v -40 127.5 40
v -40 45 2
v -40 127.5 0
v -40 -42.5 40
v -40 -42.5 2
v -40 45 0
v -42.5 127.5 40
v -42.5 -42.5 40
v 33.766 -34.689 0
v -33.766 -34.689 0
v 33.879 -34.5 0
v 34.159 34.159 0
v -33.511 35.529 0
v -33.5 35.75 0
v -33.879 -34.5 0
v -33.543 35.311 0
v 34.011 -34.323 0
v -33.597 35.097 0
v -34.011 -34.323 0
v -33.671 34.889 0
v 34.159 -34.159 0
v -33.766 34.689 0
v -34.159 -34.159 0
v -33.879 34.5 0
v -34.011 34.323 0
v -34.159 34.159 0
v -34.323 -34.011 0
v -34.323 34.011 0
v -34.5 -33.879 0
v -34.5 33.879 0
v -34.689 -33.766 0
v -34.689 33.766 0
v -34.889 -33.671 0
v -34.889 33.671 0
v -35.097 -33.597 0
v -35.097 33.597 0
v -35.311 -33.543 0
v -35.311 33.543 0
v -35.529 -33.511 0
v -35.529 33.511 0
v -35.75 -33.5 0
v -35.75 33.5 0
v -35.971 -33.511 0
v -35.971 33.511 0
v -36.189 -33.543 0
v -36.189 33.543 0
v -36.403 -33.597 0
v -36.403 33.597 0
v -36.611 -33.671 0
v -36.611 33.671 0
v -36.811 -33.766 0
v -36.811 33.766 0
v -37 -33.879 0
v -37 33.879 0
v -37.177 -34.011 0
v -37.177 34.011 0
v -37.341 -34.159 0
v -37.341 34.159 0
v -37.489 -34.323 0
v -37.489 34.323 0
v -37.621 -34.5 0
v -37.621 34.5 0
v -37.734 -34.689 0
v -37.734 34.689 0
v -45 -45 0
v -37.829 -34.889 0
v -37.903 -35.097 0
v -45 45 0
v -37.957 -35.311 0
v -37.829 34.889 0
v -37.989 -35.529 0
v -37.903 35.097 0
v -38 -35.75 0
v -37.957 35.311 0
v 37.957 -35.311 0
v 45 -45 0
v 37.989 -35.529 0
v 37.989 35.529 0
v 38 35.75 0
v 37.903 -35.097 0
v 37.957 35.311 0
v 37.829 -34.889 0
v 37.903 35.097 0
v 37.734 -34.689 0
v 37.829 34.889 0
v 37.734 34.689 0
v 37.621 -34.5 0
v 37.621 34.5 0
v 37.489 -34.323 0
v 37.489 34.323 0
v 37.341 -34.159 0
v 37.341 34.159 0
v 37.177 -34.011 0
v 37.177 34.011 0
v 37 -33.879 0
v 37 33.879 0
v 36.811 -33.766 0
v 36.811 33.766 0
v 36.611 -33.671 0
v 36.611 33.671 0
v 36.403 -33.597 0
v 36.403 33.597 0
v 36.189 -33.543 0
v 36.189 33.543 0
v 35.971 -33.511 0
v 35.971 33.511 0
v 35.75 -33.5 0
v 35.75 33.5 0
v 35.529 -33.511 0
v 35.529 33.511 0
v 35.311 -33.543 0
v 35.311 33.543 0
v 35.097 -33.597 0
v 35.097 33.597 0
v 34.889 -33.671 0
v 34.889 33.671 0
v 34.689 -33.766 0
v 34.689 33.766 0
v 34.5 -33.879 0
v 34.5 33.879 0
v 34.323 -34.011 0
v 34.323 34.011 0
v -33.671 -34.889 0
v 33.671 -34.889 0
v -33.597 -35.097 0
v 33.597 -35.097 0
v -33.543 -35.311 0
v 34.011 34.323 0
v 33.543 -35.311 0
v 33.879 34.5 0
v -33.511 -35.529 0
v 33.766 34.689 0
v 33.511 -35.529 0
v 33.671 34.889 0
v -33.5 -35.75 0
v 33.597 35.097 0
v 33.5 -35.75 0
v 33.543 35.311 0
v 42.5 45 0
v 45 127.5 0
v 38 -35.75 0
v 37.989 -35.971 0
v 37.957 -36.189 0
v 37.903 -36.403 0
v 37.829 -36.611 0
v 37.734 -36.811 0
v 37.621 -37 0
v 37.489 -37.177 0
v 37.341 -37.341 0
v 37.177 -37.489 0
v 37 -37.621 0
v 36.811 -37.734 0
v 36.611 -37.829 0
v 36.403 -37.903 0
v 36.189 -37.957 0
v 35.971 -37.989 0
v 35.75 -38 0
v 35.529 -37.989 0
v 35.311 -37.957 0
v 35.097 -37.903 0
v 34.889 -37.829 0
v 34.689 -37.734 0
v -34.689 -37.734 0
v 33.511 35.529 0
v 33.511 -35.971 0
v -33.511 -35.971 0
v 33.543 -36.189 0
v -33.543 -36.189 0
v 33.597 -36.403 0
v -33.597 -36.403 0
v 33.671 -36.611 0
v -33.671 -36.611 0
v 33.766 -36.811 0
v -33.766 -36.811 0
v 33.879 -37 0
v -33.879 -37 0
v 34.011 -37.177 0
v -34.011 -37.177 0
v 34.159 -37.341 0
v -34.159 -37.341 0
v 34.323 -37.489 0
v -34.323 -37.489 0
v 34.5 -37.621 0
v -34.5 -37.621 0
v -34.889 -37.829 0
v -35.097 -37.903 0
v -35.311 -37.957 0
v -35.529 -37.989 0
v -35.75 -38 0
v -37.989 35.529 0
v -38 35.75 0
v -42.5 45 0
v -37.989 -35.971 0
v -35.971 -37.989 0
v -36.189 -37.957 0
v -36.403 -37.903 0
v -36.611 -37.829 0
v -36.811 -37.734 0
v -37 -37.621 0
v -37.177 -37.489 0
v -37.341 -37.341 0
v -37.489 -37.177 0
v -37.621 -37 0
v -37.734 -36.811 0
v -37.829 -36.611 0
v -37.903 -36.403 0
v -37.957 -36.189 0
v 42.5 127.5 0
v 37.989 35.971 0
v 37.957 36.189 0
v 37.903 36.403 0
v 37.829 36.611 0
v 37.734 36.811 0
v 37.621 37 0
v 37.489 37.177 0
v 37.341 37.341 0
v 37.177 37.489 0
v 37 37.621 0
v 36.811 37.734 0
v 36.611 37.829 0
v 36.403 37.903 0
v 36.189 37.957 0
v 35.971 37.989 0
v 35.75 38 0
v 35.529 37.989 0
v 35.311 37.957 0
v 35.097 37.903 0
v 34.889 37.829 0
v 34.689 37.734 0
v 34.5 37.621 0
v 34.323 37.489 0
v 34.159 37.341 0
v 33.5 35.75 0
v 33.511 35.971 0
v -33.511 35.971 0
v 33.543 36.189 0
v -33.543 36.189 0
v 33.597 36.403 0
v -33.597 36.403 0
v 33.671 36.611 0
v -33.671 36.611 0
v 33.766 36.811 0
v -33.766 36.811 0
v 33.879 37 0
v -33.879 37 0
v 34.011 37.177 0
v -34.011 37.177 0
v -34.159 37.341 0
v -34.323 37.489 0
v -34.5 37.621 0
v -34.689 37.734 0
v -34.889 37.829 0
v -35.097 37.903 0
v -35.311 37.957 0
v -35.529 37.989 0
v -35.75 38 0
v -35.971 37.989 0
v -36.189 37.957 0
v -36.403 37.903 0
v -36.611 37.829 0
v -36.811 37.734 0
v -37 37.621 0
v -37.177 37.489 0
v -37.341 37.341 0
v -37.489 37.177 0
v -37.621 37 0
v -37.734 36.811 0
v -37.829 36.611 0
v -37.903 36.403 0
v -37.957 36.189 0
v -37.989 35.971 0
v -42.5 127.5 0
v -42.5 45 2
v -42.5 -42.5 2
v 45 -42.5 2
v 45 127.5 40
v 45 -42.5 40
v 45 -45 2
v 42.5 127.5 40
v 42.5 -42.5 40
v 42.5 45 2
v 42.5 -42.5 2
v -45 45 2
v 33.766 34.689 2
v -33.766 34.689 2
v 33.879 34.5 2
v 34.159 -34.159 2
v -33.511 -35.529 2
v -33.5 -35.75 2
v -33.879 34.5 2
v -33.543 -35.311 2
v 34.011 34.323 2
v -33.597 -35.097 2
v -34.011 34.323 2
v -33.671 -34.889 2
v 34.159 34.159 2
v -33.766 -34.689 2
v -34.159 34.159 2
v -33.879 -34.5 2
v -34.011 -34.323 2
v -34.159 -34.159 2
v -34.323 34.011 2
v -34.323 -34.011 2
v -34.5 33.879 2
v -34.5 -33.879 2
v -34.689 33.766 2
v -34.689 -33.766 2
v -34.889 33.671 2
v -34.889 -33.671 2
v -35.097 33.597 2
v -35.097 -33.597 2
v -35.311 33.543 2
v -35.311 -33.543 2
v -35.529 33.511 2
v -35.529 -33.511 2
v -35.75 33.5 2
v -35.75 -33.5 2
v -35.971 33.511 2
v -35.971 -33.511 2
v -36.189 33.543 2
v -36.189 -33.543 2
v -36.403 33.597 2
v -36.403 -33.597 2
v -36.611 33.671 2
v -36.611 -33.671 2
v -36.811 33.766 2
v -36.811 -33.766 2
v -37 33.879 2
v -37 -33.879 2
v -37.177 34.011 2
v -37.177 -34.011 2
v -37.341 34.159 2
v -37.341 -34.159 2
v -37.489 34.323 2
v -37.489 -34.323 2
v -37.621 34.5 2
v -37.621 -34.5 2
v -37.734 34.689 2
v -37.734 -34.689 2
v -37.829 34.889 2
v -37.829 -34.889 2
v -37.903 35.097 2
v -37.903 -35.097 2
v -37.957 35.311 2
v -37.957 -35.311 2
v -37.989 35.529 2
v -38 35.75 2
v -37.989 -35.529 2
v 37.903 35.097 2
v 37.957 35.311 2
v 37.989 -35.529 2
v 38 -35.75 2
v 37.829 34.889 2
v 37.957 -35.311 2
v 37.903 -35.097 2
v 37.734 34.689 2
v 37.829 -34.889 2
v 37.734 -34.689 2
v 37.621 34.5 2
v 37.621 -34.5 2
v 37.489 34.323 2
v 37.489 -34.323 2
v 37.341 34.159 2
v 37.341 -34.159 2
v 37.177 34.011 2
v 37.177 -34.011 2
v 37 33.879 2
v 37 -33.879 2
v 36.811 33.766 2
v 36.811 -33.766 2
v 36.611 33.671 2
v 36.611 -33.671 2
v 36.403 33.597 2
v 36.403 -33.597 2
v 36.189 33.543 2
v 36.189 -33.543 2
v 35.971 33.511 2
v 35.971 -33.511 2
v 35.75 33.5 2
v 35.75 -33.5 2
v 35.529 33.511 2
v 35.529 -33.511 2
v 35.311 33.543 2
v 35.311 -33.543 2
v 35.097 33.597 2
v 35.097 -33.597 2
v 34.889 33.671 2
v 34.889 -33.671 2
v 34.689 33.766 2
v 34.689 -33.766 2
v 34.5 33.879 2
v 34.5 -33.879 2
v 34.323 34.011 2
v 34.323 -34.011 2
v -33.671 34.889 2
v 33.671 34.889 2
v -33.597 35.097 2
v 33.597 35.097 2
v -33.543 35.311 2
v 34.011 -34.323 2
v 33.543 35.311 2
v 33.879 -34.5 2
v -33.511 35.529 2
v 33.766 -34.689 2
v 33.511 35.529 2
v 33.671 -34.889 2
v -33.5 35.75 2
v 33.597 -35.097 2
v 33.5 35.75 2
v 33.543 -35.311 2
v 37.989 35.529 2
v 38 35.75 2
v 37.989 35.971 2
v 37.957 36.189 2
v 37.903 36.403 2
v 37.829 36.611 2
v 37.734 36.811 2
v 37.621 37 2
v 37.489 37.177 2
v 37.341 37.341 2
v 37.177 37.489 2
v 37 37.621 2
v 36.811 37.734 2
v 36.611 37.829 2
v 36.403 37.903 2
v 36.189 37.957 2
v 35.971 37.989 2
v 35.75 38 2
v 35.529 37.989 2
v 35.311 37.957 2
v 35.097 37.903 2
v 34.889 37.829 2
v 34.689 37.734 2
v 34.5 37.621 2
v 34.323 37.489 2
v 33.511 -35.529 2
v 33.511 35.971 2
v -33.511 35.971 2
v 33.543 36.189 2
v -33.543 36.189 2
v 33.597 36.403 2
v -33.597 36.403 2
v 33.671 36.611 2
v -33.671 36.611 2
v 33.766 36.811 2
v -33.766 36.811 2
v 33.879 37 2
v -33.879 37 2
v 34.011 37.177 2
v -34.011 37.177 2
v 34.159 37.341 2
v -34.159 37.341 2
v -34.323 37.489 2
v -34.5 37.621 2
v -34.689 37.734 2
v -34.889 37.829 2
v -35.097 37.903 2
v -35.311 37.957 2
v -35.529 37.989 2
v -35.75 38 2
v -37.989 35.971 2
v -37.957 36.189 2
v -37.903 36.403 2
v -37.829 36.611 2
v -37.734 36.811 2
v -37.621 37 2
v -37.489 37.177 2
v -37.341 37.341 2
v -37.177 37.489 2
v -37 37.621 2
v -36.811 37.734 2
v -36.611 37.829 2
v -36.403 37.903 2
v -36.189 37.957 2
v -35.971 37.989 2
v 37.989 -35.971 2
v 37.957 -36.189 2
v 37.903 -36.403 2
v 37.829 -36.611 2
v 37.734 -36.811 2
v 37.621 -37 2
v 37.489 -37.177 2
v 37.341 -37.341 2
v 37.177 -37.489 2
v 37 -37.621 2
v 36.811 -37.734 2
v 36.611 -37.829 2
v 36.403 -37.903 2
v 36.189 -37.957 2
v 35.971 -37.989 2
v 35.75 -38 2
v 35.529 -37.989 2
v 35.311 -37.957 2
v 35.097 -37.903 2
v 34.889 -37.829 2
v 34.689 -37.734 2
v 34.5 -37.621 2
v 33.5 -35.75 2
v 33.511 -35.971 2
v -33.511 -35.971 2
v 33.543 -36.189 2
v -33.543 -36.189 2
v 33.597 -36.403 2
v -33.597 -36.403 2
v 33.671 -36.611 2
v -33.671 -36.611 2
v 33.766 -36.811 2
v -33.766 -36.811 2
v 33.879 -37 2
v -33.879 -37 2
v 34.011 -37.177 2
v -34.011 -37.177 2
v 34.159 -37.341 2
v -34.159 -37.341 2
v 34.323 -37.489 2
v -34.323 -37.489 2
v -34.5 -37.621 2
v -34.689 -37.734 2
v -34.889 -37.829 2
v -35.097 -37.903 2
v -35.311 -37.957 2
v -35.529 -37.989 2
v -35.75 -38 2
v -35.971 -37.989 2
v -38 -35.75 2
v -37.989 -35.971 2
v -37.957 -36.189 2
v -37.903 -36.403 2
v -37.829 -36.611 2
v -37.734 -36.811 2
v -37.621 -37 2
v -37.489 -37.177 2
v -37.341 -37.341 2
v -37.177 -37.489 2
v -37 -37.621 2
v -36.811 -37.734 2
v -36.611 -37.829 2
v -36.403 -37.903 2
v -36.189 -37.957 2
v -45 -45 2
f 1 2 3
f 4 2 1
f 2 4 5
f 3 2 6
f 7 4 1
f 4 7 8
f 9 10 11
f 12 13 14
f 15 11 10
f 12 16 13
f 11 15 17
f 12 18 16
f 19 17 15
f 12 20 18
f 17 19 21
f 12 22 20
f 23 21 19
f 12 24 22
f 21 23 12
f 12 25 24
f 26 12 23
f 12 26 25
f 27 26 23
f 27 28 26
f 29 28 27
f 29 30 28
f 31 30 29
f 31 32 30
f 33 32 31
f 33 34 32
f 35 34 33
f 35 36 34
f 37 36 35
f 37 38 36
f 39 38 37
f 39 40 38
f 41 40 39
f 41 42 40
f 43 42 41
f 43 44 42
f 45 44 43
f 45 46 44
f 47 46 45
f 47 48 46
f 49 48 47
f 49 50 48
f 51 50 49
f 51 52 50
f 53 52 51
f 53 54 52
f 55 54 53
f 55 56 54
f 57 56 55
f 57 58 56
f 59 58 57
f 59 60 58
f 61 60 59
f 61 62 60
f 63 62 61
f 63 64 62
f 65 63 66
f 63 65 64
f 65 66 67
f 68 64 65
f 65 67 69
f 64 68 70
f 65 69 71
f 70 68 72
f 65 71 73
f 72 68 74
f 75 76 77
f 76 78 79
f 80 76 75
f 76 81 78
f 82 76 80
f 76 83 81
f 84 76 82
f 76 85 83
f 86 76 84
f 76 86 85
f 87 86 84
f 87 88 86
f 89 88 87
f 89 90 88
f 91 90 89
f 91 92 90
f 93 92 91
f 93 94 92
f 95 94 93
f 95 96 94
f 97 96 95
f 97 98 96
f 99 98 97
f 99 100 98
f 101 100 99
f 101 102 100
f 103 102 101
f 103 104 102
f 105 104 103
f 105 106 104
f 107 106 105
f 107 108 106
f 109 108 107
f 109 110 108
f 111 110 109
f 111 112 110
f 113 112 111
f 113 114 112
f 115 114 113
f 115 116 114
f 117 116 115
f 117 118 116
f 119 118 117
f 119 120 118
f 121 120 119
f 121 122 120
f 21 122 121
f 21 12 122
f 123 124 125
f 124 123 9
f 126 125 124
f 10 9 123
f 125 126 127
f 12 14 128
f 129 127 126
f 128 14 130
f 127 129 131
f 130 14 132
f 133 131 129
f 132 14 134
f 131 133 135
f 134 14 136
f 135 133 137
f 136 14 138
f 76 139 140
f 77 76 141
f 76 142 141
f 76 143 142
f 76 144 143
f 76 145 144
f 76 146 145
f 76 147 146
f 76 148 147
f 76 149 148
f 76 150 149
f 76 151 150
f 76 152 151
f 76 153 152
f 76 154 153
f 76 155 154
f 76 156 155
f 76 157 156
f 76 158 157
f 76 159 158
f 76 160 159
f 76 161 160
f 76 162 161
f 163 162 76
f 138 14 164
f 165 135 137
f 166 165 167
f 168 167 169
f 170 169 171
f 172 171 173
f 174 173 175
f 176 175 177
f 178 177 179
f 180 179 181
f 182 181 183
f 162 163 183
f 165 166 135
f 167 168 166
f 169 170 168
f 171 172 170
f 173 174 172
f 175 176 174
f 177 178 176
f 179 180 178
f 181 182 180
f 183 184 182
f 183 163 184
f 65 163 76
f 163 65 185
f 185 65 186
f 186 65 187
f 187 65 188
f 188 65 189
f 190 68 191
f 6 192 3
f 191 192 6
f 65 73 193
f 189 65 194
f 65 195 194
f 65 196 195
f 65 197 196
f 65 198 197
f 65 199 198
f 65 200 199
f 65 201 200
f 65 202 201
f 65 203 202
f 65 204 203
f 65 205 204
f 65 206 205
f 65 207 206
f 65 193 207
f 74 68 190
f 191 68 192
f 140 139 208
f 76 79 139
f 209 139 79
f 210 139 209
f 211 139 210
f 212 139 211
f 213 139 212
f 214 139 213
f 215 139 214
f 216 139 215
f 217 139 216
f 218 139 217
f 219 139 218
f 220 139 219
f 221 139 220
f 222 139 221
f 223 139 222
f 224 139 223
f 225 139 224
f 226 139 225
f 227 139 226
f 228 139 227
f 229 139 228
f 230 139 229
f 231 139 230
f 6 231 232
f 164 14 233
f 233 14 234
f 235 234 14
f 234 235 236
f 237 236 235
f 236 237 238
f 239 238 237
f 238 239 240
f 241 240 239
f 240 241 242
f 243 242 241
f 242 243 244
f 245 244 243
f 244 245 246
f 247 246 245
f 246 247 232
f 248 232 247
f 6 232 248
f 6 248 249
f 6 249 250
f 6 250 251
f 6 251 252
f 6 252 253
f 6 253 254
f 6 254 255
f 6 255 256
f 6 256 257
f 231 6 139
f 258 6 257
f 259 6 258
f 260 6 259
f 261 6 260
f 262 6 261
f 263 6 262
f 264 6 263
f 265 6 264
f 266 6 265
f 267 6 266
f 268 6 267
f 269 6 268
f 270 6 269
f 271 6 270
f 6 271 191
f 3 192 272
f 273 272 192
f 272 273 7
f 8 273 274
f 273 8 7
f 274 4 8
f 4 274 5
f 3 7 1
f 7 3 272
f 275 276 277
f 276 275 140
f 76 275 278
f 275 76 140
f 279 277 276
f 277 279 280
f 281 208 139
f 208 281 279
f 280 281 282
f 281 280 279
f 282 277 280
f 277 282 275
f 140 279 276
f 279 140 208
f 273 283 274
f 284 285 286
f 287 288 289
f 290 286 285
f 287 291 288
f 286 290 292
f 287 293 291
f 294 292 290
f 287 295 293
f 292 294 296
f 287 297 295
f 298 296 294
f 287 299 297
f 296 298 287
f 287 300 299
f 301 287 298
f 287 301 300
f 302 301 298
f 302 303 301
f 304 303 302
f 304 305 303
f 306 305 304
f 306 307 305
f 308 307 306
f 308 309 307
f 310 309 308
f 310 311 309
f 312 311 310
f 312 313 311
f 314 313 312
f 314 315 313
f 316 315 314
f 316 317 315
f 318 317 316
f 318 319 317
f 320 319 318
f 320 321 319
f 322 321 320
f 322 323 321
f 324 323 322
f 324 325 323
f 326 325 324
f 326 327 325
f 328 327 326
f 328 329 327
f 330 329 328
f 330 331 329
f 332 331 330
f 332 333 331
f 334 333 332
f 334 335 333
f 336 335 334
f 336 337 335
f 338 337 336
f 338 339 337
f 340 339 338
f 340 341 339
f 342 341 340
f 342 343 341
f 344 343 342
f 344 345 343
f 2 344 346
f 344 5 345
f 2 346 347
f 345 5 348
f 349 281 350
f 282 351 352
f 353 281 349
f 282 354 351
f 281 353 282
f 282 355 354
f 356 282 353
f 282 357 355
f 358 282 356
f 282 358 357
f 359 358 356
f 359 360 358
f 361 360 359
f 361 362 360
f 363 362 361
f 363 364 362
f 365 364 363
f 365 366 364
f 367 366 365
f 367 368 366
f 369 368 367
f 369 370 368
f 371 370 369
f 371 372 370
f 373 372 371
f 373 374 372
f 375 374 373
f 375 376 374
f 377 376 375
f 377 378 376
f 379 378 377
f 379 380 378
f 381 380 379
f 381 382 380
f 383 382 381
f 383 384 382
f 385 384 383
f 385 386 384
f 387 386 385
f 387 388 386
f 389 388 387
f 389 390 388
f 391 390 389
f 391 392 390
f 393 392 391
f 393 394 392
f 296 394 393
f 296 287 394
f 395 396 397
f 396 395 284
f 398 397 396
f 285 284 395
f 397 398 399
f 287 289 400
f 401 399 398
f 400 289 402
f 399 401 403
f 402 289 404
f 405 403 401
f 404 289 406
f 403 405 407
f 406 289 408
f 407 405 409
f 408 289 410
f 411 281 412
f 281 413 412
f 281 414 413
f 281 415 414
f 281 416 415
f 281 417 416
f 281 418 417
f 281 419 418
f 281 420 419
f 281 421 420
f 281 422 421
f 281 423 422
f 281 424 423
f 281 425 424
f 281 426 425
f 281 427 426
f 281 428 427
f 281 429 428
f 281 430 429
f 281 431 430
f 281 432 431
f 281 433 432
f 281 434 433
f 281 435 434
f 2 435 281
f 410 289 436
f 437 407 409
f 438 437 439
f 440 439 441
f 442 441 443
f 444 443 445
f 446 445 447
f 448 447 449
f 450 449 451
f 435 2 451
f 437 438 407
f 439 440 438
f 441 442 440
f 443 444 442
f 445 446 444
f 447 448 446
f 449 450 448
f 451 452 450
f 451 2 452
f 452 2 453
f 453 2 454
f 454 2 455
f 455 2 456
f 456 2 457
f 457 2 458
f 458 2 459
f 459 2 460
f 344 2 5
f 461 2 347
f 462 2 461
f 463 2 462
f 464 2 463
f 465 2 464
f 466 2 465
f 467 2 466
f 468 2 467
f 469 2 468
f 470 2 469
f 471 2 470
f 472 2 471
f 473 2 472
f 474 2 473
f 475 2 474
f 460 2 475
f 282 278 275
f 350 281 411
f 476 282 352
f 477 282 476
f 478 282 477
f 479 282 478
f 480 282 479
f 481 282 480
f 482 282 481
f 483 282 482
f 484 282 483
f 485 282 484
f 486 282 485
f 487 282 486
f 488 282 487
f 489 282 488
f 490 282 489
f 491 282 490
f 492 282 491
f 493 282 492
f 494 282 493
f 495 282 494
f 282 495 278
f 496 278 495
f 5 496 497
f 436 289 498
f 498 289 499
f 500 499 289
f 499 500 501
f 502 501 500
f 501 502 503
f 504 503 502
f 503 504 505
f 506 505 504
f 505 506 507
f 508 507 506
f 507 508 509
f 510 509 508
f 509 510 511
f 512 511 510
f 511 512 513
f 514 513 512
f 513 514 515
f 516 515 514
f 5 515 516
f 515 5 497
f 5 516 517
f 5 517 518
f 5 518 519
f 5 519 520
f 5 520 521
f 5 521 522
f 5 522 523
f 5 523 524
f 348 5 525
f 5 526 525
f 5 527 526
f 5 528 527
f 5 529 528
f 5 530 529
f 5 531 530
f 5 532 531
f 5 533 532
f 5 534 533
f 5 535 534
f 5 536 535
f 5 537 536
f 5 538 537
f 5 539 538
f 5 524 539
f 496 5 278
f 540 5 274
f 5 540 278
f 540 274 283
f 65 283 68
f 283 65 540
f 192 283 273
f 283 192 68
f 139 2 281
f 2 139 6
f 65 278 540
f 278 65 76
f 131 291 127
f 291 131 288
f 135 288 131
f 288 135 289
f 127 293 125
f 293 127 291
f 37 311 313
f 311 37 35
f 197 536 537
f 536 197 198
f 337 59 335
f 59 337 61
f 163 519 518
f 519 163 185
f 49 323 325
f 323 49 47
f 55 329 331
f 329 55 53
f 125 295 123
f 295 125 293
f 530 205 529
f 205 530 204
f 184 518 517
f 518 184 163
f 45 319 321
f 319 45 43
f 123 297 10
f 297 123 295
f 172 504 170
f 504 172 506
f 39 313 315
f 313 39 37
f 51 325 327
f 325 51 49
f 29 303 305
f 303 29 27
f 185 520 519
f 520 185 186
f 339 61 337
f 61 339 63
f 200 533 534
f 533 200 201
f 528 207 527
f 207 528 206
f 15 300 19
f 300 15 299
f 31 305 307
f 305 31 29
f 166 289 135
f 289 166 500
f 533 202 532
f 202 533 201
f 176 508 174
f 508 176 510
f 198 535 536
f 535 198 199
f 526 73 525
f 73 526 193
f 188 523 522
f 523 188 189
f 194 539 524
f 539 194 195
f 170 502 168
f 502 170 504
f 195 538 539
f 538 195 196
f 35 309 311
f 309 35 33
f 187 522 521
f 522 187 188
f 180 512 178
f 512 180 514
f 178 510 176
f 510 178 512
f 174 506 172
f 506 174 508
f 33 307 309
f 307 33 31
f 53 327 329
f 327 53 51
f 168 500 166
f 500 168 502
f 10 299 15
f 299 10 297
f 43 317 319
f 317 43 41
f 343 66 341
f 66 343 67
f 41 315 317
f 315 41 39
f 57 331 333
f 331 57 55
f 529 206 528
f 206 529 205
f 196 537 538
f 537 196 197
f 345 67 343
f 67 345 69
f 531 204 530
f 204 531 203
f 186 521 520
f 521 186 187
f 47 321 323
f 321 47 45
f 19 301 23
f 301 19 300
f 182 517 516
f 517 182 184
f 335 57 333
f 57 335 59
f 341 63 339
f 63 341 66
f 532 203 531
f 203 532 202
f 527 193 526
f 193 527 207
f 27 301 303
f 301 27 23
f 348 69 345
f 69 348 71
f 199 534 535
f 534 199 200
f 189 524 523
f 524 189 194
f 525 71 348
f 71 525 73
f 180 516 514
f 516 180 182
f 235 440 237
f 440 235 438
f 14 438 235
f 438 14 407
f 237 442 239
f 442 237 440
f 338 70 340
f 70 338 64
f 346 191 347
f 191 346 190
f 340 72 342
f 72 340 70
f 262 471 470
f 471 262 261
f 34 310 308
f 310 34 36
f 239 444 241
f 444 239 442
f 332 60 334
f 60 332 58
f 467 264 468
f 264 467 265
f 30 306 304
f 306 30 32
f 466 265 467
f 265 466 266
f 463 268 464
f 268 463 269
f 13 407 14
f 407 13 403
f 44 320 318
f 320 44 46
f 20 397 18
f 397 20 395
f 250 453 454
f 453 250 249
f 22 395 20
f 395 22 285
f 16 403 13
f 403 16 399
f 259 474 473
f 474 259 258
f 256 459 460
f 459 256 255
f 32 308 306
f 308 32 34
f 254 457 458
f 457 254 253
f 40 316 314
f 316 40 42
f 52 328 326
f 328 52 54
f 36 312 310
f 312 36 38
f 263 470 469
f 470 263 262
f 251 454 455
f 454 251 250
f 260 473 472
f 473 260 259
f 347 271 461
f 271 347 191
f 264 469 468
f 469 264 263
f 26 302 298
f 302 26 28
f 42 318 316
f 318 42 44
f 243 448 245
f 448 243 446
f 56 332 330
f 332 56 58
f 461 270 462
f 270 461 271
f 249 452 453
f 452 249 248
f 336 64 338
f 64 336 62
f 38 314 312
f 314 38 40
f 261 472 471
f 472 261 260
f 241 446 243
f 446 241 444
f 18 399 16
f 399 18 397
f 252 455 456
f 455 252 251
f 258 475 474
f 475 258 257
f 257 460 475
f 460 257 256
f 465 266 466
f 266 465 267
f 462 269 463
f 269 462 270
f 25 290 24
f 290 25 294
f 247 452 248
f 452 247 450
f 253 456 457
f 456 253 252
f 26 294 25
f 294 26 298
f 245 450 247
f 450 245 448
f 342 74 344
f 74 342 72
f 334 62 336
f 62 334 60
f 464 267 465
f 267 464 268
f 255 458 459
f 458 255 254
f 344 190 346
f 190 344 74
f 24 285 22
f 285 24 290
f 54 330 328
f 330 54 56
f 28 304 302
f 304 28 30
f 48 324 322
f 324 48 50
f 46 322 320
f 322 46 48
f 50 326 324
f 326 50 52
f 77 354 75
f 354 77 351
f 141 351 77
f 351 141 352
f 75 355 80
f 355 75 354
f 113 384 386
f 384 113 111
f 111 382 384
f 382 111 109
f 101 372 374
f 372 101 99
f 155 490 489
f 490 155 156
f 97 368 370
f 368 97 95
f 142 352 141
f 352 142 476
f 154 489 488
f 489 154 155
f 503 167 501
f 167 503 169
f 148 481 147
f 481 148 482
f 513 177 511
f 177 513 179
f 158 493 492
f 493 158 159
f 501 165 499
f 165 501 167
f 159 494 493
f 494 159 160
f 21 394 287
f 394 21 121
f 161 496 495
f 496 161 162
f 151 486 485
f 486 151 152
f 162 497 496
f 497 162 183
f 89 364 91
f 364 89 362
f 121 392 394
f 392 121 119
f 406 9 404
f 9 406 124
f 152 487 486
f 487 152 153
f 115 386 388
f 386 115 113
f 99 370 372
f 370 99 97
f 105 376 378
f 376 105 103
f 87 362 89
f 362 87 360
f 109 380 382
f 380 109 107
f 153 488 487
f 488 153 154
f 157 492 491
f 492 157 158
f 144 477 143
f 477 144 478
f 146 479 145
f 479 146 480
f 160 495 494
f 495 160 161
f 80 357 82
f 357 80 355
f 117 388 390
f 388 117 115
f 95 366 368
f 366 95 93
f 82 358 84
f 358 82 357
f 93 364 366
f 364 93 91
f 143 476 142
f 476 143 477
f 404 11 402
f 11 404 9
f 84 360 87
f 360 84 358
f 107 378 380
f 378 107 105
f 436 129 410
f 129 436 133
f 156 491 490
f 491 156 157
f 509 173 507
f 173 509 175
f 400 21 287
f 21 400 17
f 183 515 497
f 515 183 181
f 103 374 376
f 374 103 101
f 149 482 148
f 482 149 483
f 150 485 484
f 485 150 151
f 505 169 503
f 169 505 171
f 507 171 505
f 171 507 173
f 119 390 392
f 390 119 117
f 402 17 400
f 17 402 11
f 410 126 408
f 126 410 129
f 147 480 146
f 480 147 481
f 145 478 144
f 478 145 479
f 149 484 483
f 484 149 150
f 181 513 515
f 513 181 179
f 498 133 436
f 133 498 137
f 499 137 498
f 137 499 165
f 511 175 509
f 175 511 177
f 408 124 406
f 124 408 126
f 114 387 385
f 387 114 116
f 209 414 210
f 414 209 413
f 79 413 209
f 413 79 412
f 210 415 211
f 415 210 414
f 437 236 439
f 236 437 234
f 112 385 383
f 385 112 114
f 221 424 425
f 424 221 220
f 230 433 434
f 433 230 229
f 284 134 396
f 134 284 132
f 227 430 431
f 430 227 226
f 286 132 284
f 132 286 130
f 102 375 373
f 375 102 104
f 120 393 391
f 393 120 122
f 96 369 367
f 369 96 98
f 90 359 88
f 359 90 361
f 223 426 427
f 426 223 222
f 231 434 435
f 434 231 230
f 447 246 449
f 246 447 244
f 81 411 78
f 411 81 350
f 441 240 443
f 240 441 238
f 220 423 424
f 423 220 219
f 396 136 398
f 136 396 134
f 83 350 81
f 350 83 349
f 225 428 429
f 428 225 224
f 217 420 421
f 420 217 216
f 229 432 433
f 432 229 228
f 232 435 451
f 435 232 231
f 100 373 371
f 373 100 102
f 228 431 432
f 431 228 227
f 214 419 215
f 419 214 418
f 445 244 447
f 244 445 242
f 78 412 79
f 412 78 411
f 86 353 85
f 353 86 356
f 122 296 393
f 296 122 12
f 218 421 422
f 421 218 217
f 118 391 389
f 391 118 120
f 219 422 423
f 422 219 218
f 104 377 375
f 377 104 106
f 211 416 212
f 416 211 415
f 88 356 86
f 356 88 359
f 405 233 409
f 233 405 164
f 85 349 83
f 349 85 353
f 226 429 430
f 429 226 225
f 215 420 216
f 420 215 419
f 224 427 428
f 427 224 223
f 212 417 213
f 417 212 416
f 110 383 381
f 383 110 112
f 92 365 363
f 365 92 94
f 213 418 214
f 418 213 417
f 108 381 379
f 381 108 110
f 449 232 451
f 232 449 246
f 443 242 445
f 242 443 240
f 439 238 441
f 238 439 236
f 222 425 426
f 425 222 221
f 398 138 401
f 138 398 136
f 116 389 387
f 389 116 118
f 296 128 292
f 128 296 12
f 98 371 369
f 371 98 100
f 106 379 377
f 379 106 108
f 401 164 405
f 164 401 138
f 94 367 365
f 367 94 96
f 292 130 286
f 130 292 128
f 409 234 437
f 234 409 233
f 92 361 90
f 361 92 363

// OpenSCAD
// DIY magnetic stirrer housing for 80 mm PC case fan
// Print orientation: top plate on bed (z = 0), walls build upward (+Z)
// Note: this is the "upside-down" open box used in operation

// ---------- Dimensions (mm) ----------
outer_size     = 90;    // overall outer size in X and Y
top_plate_t    = 2;     // thickness of the closed top plate
wall_t         = 2.5;   // thickness of the four walls
open_top_z     = 40;    // height where the box is open (top of walls)

screw_hole_d   = 4.5;   // diameter of M4 screw holes
screw_hole_pat = 71.5;  // square pattern pitch for screw holes (X and Y)

notch_w        = 12;    // width of the power cable notch
notch_bottom_z = 32;    // notch reaches down to this height (from open edge)

eps            = 0.5;   // overshoot for clean boolean cuts

$fn = 64;

// ---------- Model ----------
difference() {
    union() {
        // Top plate (lies on the bed in print orientation)
        translate([-outer_size/2, -outer_size/2, 0])
            cube([outer_size, outer_size, top_plate_t]);

        // Four walls rising from the top plate to the open top
        for (dx = [-1, 1], dy = [-1, 1]) {
            translate([
                dx * (outer_size/2 - wall_t),
                dy * (outer_size/2 - wall_t),
                0
            ])
                cube([wall_t, outer_size - 2*wall_t, open_top_z]);
        }
    }

    // Screw holes through the top plate, centred on the plate
    for (x = [-screw_hole_pat/2, screw_hole_pat/2],
         y = [-screw_hole_pat/2, screw_hole_pat/2])
        translate([x, y, -eps])
            cylinder(d = screw_hole_d, h = top_plate_t + 2*eps);

    // Notch for the power cable in one wall
    // Placed along x, centred on Y, opening into the box from the top edge
    translate([-notch_w/2, 0, notch_bottom_z])
        cube([notch_w, outer_size - 2*wall_t, open_top_z - notch_bottom_z + eps]);
}
